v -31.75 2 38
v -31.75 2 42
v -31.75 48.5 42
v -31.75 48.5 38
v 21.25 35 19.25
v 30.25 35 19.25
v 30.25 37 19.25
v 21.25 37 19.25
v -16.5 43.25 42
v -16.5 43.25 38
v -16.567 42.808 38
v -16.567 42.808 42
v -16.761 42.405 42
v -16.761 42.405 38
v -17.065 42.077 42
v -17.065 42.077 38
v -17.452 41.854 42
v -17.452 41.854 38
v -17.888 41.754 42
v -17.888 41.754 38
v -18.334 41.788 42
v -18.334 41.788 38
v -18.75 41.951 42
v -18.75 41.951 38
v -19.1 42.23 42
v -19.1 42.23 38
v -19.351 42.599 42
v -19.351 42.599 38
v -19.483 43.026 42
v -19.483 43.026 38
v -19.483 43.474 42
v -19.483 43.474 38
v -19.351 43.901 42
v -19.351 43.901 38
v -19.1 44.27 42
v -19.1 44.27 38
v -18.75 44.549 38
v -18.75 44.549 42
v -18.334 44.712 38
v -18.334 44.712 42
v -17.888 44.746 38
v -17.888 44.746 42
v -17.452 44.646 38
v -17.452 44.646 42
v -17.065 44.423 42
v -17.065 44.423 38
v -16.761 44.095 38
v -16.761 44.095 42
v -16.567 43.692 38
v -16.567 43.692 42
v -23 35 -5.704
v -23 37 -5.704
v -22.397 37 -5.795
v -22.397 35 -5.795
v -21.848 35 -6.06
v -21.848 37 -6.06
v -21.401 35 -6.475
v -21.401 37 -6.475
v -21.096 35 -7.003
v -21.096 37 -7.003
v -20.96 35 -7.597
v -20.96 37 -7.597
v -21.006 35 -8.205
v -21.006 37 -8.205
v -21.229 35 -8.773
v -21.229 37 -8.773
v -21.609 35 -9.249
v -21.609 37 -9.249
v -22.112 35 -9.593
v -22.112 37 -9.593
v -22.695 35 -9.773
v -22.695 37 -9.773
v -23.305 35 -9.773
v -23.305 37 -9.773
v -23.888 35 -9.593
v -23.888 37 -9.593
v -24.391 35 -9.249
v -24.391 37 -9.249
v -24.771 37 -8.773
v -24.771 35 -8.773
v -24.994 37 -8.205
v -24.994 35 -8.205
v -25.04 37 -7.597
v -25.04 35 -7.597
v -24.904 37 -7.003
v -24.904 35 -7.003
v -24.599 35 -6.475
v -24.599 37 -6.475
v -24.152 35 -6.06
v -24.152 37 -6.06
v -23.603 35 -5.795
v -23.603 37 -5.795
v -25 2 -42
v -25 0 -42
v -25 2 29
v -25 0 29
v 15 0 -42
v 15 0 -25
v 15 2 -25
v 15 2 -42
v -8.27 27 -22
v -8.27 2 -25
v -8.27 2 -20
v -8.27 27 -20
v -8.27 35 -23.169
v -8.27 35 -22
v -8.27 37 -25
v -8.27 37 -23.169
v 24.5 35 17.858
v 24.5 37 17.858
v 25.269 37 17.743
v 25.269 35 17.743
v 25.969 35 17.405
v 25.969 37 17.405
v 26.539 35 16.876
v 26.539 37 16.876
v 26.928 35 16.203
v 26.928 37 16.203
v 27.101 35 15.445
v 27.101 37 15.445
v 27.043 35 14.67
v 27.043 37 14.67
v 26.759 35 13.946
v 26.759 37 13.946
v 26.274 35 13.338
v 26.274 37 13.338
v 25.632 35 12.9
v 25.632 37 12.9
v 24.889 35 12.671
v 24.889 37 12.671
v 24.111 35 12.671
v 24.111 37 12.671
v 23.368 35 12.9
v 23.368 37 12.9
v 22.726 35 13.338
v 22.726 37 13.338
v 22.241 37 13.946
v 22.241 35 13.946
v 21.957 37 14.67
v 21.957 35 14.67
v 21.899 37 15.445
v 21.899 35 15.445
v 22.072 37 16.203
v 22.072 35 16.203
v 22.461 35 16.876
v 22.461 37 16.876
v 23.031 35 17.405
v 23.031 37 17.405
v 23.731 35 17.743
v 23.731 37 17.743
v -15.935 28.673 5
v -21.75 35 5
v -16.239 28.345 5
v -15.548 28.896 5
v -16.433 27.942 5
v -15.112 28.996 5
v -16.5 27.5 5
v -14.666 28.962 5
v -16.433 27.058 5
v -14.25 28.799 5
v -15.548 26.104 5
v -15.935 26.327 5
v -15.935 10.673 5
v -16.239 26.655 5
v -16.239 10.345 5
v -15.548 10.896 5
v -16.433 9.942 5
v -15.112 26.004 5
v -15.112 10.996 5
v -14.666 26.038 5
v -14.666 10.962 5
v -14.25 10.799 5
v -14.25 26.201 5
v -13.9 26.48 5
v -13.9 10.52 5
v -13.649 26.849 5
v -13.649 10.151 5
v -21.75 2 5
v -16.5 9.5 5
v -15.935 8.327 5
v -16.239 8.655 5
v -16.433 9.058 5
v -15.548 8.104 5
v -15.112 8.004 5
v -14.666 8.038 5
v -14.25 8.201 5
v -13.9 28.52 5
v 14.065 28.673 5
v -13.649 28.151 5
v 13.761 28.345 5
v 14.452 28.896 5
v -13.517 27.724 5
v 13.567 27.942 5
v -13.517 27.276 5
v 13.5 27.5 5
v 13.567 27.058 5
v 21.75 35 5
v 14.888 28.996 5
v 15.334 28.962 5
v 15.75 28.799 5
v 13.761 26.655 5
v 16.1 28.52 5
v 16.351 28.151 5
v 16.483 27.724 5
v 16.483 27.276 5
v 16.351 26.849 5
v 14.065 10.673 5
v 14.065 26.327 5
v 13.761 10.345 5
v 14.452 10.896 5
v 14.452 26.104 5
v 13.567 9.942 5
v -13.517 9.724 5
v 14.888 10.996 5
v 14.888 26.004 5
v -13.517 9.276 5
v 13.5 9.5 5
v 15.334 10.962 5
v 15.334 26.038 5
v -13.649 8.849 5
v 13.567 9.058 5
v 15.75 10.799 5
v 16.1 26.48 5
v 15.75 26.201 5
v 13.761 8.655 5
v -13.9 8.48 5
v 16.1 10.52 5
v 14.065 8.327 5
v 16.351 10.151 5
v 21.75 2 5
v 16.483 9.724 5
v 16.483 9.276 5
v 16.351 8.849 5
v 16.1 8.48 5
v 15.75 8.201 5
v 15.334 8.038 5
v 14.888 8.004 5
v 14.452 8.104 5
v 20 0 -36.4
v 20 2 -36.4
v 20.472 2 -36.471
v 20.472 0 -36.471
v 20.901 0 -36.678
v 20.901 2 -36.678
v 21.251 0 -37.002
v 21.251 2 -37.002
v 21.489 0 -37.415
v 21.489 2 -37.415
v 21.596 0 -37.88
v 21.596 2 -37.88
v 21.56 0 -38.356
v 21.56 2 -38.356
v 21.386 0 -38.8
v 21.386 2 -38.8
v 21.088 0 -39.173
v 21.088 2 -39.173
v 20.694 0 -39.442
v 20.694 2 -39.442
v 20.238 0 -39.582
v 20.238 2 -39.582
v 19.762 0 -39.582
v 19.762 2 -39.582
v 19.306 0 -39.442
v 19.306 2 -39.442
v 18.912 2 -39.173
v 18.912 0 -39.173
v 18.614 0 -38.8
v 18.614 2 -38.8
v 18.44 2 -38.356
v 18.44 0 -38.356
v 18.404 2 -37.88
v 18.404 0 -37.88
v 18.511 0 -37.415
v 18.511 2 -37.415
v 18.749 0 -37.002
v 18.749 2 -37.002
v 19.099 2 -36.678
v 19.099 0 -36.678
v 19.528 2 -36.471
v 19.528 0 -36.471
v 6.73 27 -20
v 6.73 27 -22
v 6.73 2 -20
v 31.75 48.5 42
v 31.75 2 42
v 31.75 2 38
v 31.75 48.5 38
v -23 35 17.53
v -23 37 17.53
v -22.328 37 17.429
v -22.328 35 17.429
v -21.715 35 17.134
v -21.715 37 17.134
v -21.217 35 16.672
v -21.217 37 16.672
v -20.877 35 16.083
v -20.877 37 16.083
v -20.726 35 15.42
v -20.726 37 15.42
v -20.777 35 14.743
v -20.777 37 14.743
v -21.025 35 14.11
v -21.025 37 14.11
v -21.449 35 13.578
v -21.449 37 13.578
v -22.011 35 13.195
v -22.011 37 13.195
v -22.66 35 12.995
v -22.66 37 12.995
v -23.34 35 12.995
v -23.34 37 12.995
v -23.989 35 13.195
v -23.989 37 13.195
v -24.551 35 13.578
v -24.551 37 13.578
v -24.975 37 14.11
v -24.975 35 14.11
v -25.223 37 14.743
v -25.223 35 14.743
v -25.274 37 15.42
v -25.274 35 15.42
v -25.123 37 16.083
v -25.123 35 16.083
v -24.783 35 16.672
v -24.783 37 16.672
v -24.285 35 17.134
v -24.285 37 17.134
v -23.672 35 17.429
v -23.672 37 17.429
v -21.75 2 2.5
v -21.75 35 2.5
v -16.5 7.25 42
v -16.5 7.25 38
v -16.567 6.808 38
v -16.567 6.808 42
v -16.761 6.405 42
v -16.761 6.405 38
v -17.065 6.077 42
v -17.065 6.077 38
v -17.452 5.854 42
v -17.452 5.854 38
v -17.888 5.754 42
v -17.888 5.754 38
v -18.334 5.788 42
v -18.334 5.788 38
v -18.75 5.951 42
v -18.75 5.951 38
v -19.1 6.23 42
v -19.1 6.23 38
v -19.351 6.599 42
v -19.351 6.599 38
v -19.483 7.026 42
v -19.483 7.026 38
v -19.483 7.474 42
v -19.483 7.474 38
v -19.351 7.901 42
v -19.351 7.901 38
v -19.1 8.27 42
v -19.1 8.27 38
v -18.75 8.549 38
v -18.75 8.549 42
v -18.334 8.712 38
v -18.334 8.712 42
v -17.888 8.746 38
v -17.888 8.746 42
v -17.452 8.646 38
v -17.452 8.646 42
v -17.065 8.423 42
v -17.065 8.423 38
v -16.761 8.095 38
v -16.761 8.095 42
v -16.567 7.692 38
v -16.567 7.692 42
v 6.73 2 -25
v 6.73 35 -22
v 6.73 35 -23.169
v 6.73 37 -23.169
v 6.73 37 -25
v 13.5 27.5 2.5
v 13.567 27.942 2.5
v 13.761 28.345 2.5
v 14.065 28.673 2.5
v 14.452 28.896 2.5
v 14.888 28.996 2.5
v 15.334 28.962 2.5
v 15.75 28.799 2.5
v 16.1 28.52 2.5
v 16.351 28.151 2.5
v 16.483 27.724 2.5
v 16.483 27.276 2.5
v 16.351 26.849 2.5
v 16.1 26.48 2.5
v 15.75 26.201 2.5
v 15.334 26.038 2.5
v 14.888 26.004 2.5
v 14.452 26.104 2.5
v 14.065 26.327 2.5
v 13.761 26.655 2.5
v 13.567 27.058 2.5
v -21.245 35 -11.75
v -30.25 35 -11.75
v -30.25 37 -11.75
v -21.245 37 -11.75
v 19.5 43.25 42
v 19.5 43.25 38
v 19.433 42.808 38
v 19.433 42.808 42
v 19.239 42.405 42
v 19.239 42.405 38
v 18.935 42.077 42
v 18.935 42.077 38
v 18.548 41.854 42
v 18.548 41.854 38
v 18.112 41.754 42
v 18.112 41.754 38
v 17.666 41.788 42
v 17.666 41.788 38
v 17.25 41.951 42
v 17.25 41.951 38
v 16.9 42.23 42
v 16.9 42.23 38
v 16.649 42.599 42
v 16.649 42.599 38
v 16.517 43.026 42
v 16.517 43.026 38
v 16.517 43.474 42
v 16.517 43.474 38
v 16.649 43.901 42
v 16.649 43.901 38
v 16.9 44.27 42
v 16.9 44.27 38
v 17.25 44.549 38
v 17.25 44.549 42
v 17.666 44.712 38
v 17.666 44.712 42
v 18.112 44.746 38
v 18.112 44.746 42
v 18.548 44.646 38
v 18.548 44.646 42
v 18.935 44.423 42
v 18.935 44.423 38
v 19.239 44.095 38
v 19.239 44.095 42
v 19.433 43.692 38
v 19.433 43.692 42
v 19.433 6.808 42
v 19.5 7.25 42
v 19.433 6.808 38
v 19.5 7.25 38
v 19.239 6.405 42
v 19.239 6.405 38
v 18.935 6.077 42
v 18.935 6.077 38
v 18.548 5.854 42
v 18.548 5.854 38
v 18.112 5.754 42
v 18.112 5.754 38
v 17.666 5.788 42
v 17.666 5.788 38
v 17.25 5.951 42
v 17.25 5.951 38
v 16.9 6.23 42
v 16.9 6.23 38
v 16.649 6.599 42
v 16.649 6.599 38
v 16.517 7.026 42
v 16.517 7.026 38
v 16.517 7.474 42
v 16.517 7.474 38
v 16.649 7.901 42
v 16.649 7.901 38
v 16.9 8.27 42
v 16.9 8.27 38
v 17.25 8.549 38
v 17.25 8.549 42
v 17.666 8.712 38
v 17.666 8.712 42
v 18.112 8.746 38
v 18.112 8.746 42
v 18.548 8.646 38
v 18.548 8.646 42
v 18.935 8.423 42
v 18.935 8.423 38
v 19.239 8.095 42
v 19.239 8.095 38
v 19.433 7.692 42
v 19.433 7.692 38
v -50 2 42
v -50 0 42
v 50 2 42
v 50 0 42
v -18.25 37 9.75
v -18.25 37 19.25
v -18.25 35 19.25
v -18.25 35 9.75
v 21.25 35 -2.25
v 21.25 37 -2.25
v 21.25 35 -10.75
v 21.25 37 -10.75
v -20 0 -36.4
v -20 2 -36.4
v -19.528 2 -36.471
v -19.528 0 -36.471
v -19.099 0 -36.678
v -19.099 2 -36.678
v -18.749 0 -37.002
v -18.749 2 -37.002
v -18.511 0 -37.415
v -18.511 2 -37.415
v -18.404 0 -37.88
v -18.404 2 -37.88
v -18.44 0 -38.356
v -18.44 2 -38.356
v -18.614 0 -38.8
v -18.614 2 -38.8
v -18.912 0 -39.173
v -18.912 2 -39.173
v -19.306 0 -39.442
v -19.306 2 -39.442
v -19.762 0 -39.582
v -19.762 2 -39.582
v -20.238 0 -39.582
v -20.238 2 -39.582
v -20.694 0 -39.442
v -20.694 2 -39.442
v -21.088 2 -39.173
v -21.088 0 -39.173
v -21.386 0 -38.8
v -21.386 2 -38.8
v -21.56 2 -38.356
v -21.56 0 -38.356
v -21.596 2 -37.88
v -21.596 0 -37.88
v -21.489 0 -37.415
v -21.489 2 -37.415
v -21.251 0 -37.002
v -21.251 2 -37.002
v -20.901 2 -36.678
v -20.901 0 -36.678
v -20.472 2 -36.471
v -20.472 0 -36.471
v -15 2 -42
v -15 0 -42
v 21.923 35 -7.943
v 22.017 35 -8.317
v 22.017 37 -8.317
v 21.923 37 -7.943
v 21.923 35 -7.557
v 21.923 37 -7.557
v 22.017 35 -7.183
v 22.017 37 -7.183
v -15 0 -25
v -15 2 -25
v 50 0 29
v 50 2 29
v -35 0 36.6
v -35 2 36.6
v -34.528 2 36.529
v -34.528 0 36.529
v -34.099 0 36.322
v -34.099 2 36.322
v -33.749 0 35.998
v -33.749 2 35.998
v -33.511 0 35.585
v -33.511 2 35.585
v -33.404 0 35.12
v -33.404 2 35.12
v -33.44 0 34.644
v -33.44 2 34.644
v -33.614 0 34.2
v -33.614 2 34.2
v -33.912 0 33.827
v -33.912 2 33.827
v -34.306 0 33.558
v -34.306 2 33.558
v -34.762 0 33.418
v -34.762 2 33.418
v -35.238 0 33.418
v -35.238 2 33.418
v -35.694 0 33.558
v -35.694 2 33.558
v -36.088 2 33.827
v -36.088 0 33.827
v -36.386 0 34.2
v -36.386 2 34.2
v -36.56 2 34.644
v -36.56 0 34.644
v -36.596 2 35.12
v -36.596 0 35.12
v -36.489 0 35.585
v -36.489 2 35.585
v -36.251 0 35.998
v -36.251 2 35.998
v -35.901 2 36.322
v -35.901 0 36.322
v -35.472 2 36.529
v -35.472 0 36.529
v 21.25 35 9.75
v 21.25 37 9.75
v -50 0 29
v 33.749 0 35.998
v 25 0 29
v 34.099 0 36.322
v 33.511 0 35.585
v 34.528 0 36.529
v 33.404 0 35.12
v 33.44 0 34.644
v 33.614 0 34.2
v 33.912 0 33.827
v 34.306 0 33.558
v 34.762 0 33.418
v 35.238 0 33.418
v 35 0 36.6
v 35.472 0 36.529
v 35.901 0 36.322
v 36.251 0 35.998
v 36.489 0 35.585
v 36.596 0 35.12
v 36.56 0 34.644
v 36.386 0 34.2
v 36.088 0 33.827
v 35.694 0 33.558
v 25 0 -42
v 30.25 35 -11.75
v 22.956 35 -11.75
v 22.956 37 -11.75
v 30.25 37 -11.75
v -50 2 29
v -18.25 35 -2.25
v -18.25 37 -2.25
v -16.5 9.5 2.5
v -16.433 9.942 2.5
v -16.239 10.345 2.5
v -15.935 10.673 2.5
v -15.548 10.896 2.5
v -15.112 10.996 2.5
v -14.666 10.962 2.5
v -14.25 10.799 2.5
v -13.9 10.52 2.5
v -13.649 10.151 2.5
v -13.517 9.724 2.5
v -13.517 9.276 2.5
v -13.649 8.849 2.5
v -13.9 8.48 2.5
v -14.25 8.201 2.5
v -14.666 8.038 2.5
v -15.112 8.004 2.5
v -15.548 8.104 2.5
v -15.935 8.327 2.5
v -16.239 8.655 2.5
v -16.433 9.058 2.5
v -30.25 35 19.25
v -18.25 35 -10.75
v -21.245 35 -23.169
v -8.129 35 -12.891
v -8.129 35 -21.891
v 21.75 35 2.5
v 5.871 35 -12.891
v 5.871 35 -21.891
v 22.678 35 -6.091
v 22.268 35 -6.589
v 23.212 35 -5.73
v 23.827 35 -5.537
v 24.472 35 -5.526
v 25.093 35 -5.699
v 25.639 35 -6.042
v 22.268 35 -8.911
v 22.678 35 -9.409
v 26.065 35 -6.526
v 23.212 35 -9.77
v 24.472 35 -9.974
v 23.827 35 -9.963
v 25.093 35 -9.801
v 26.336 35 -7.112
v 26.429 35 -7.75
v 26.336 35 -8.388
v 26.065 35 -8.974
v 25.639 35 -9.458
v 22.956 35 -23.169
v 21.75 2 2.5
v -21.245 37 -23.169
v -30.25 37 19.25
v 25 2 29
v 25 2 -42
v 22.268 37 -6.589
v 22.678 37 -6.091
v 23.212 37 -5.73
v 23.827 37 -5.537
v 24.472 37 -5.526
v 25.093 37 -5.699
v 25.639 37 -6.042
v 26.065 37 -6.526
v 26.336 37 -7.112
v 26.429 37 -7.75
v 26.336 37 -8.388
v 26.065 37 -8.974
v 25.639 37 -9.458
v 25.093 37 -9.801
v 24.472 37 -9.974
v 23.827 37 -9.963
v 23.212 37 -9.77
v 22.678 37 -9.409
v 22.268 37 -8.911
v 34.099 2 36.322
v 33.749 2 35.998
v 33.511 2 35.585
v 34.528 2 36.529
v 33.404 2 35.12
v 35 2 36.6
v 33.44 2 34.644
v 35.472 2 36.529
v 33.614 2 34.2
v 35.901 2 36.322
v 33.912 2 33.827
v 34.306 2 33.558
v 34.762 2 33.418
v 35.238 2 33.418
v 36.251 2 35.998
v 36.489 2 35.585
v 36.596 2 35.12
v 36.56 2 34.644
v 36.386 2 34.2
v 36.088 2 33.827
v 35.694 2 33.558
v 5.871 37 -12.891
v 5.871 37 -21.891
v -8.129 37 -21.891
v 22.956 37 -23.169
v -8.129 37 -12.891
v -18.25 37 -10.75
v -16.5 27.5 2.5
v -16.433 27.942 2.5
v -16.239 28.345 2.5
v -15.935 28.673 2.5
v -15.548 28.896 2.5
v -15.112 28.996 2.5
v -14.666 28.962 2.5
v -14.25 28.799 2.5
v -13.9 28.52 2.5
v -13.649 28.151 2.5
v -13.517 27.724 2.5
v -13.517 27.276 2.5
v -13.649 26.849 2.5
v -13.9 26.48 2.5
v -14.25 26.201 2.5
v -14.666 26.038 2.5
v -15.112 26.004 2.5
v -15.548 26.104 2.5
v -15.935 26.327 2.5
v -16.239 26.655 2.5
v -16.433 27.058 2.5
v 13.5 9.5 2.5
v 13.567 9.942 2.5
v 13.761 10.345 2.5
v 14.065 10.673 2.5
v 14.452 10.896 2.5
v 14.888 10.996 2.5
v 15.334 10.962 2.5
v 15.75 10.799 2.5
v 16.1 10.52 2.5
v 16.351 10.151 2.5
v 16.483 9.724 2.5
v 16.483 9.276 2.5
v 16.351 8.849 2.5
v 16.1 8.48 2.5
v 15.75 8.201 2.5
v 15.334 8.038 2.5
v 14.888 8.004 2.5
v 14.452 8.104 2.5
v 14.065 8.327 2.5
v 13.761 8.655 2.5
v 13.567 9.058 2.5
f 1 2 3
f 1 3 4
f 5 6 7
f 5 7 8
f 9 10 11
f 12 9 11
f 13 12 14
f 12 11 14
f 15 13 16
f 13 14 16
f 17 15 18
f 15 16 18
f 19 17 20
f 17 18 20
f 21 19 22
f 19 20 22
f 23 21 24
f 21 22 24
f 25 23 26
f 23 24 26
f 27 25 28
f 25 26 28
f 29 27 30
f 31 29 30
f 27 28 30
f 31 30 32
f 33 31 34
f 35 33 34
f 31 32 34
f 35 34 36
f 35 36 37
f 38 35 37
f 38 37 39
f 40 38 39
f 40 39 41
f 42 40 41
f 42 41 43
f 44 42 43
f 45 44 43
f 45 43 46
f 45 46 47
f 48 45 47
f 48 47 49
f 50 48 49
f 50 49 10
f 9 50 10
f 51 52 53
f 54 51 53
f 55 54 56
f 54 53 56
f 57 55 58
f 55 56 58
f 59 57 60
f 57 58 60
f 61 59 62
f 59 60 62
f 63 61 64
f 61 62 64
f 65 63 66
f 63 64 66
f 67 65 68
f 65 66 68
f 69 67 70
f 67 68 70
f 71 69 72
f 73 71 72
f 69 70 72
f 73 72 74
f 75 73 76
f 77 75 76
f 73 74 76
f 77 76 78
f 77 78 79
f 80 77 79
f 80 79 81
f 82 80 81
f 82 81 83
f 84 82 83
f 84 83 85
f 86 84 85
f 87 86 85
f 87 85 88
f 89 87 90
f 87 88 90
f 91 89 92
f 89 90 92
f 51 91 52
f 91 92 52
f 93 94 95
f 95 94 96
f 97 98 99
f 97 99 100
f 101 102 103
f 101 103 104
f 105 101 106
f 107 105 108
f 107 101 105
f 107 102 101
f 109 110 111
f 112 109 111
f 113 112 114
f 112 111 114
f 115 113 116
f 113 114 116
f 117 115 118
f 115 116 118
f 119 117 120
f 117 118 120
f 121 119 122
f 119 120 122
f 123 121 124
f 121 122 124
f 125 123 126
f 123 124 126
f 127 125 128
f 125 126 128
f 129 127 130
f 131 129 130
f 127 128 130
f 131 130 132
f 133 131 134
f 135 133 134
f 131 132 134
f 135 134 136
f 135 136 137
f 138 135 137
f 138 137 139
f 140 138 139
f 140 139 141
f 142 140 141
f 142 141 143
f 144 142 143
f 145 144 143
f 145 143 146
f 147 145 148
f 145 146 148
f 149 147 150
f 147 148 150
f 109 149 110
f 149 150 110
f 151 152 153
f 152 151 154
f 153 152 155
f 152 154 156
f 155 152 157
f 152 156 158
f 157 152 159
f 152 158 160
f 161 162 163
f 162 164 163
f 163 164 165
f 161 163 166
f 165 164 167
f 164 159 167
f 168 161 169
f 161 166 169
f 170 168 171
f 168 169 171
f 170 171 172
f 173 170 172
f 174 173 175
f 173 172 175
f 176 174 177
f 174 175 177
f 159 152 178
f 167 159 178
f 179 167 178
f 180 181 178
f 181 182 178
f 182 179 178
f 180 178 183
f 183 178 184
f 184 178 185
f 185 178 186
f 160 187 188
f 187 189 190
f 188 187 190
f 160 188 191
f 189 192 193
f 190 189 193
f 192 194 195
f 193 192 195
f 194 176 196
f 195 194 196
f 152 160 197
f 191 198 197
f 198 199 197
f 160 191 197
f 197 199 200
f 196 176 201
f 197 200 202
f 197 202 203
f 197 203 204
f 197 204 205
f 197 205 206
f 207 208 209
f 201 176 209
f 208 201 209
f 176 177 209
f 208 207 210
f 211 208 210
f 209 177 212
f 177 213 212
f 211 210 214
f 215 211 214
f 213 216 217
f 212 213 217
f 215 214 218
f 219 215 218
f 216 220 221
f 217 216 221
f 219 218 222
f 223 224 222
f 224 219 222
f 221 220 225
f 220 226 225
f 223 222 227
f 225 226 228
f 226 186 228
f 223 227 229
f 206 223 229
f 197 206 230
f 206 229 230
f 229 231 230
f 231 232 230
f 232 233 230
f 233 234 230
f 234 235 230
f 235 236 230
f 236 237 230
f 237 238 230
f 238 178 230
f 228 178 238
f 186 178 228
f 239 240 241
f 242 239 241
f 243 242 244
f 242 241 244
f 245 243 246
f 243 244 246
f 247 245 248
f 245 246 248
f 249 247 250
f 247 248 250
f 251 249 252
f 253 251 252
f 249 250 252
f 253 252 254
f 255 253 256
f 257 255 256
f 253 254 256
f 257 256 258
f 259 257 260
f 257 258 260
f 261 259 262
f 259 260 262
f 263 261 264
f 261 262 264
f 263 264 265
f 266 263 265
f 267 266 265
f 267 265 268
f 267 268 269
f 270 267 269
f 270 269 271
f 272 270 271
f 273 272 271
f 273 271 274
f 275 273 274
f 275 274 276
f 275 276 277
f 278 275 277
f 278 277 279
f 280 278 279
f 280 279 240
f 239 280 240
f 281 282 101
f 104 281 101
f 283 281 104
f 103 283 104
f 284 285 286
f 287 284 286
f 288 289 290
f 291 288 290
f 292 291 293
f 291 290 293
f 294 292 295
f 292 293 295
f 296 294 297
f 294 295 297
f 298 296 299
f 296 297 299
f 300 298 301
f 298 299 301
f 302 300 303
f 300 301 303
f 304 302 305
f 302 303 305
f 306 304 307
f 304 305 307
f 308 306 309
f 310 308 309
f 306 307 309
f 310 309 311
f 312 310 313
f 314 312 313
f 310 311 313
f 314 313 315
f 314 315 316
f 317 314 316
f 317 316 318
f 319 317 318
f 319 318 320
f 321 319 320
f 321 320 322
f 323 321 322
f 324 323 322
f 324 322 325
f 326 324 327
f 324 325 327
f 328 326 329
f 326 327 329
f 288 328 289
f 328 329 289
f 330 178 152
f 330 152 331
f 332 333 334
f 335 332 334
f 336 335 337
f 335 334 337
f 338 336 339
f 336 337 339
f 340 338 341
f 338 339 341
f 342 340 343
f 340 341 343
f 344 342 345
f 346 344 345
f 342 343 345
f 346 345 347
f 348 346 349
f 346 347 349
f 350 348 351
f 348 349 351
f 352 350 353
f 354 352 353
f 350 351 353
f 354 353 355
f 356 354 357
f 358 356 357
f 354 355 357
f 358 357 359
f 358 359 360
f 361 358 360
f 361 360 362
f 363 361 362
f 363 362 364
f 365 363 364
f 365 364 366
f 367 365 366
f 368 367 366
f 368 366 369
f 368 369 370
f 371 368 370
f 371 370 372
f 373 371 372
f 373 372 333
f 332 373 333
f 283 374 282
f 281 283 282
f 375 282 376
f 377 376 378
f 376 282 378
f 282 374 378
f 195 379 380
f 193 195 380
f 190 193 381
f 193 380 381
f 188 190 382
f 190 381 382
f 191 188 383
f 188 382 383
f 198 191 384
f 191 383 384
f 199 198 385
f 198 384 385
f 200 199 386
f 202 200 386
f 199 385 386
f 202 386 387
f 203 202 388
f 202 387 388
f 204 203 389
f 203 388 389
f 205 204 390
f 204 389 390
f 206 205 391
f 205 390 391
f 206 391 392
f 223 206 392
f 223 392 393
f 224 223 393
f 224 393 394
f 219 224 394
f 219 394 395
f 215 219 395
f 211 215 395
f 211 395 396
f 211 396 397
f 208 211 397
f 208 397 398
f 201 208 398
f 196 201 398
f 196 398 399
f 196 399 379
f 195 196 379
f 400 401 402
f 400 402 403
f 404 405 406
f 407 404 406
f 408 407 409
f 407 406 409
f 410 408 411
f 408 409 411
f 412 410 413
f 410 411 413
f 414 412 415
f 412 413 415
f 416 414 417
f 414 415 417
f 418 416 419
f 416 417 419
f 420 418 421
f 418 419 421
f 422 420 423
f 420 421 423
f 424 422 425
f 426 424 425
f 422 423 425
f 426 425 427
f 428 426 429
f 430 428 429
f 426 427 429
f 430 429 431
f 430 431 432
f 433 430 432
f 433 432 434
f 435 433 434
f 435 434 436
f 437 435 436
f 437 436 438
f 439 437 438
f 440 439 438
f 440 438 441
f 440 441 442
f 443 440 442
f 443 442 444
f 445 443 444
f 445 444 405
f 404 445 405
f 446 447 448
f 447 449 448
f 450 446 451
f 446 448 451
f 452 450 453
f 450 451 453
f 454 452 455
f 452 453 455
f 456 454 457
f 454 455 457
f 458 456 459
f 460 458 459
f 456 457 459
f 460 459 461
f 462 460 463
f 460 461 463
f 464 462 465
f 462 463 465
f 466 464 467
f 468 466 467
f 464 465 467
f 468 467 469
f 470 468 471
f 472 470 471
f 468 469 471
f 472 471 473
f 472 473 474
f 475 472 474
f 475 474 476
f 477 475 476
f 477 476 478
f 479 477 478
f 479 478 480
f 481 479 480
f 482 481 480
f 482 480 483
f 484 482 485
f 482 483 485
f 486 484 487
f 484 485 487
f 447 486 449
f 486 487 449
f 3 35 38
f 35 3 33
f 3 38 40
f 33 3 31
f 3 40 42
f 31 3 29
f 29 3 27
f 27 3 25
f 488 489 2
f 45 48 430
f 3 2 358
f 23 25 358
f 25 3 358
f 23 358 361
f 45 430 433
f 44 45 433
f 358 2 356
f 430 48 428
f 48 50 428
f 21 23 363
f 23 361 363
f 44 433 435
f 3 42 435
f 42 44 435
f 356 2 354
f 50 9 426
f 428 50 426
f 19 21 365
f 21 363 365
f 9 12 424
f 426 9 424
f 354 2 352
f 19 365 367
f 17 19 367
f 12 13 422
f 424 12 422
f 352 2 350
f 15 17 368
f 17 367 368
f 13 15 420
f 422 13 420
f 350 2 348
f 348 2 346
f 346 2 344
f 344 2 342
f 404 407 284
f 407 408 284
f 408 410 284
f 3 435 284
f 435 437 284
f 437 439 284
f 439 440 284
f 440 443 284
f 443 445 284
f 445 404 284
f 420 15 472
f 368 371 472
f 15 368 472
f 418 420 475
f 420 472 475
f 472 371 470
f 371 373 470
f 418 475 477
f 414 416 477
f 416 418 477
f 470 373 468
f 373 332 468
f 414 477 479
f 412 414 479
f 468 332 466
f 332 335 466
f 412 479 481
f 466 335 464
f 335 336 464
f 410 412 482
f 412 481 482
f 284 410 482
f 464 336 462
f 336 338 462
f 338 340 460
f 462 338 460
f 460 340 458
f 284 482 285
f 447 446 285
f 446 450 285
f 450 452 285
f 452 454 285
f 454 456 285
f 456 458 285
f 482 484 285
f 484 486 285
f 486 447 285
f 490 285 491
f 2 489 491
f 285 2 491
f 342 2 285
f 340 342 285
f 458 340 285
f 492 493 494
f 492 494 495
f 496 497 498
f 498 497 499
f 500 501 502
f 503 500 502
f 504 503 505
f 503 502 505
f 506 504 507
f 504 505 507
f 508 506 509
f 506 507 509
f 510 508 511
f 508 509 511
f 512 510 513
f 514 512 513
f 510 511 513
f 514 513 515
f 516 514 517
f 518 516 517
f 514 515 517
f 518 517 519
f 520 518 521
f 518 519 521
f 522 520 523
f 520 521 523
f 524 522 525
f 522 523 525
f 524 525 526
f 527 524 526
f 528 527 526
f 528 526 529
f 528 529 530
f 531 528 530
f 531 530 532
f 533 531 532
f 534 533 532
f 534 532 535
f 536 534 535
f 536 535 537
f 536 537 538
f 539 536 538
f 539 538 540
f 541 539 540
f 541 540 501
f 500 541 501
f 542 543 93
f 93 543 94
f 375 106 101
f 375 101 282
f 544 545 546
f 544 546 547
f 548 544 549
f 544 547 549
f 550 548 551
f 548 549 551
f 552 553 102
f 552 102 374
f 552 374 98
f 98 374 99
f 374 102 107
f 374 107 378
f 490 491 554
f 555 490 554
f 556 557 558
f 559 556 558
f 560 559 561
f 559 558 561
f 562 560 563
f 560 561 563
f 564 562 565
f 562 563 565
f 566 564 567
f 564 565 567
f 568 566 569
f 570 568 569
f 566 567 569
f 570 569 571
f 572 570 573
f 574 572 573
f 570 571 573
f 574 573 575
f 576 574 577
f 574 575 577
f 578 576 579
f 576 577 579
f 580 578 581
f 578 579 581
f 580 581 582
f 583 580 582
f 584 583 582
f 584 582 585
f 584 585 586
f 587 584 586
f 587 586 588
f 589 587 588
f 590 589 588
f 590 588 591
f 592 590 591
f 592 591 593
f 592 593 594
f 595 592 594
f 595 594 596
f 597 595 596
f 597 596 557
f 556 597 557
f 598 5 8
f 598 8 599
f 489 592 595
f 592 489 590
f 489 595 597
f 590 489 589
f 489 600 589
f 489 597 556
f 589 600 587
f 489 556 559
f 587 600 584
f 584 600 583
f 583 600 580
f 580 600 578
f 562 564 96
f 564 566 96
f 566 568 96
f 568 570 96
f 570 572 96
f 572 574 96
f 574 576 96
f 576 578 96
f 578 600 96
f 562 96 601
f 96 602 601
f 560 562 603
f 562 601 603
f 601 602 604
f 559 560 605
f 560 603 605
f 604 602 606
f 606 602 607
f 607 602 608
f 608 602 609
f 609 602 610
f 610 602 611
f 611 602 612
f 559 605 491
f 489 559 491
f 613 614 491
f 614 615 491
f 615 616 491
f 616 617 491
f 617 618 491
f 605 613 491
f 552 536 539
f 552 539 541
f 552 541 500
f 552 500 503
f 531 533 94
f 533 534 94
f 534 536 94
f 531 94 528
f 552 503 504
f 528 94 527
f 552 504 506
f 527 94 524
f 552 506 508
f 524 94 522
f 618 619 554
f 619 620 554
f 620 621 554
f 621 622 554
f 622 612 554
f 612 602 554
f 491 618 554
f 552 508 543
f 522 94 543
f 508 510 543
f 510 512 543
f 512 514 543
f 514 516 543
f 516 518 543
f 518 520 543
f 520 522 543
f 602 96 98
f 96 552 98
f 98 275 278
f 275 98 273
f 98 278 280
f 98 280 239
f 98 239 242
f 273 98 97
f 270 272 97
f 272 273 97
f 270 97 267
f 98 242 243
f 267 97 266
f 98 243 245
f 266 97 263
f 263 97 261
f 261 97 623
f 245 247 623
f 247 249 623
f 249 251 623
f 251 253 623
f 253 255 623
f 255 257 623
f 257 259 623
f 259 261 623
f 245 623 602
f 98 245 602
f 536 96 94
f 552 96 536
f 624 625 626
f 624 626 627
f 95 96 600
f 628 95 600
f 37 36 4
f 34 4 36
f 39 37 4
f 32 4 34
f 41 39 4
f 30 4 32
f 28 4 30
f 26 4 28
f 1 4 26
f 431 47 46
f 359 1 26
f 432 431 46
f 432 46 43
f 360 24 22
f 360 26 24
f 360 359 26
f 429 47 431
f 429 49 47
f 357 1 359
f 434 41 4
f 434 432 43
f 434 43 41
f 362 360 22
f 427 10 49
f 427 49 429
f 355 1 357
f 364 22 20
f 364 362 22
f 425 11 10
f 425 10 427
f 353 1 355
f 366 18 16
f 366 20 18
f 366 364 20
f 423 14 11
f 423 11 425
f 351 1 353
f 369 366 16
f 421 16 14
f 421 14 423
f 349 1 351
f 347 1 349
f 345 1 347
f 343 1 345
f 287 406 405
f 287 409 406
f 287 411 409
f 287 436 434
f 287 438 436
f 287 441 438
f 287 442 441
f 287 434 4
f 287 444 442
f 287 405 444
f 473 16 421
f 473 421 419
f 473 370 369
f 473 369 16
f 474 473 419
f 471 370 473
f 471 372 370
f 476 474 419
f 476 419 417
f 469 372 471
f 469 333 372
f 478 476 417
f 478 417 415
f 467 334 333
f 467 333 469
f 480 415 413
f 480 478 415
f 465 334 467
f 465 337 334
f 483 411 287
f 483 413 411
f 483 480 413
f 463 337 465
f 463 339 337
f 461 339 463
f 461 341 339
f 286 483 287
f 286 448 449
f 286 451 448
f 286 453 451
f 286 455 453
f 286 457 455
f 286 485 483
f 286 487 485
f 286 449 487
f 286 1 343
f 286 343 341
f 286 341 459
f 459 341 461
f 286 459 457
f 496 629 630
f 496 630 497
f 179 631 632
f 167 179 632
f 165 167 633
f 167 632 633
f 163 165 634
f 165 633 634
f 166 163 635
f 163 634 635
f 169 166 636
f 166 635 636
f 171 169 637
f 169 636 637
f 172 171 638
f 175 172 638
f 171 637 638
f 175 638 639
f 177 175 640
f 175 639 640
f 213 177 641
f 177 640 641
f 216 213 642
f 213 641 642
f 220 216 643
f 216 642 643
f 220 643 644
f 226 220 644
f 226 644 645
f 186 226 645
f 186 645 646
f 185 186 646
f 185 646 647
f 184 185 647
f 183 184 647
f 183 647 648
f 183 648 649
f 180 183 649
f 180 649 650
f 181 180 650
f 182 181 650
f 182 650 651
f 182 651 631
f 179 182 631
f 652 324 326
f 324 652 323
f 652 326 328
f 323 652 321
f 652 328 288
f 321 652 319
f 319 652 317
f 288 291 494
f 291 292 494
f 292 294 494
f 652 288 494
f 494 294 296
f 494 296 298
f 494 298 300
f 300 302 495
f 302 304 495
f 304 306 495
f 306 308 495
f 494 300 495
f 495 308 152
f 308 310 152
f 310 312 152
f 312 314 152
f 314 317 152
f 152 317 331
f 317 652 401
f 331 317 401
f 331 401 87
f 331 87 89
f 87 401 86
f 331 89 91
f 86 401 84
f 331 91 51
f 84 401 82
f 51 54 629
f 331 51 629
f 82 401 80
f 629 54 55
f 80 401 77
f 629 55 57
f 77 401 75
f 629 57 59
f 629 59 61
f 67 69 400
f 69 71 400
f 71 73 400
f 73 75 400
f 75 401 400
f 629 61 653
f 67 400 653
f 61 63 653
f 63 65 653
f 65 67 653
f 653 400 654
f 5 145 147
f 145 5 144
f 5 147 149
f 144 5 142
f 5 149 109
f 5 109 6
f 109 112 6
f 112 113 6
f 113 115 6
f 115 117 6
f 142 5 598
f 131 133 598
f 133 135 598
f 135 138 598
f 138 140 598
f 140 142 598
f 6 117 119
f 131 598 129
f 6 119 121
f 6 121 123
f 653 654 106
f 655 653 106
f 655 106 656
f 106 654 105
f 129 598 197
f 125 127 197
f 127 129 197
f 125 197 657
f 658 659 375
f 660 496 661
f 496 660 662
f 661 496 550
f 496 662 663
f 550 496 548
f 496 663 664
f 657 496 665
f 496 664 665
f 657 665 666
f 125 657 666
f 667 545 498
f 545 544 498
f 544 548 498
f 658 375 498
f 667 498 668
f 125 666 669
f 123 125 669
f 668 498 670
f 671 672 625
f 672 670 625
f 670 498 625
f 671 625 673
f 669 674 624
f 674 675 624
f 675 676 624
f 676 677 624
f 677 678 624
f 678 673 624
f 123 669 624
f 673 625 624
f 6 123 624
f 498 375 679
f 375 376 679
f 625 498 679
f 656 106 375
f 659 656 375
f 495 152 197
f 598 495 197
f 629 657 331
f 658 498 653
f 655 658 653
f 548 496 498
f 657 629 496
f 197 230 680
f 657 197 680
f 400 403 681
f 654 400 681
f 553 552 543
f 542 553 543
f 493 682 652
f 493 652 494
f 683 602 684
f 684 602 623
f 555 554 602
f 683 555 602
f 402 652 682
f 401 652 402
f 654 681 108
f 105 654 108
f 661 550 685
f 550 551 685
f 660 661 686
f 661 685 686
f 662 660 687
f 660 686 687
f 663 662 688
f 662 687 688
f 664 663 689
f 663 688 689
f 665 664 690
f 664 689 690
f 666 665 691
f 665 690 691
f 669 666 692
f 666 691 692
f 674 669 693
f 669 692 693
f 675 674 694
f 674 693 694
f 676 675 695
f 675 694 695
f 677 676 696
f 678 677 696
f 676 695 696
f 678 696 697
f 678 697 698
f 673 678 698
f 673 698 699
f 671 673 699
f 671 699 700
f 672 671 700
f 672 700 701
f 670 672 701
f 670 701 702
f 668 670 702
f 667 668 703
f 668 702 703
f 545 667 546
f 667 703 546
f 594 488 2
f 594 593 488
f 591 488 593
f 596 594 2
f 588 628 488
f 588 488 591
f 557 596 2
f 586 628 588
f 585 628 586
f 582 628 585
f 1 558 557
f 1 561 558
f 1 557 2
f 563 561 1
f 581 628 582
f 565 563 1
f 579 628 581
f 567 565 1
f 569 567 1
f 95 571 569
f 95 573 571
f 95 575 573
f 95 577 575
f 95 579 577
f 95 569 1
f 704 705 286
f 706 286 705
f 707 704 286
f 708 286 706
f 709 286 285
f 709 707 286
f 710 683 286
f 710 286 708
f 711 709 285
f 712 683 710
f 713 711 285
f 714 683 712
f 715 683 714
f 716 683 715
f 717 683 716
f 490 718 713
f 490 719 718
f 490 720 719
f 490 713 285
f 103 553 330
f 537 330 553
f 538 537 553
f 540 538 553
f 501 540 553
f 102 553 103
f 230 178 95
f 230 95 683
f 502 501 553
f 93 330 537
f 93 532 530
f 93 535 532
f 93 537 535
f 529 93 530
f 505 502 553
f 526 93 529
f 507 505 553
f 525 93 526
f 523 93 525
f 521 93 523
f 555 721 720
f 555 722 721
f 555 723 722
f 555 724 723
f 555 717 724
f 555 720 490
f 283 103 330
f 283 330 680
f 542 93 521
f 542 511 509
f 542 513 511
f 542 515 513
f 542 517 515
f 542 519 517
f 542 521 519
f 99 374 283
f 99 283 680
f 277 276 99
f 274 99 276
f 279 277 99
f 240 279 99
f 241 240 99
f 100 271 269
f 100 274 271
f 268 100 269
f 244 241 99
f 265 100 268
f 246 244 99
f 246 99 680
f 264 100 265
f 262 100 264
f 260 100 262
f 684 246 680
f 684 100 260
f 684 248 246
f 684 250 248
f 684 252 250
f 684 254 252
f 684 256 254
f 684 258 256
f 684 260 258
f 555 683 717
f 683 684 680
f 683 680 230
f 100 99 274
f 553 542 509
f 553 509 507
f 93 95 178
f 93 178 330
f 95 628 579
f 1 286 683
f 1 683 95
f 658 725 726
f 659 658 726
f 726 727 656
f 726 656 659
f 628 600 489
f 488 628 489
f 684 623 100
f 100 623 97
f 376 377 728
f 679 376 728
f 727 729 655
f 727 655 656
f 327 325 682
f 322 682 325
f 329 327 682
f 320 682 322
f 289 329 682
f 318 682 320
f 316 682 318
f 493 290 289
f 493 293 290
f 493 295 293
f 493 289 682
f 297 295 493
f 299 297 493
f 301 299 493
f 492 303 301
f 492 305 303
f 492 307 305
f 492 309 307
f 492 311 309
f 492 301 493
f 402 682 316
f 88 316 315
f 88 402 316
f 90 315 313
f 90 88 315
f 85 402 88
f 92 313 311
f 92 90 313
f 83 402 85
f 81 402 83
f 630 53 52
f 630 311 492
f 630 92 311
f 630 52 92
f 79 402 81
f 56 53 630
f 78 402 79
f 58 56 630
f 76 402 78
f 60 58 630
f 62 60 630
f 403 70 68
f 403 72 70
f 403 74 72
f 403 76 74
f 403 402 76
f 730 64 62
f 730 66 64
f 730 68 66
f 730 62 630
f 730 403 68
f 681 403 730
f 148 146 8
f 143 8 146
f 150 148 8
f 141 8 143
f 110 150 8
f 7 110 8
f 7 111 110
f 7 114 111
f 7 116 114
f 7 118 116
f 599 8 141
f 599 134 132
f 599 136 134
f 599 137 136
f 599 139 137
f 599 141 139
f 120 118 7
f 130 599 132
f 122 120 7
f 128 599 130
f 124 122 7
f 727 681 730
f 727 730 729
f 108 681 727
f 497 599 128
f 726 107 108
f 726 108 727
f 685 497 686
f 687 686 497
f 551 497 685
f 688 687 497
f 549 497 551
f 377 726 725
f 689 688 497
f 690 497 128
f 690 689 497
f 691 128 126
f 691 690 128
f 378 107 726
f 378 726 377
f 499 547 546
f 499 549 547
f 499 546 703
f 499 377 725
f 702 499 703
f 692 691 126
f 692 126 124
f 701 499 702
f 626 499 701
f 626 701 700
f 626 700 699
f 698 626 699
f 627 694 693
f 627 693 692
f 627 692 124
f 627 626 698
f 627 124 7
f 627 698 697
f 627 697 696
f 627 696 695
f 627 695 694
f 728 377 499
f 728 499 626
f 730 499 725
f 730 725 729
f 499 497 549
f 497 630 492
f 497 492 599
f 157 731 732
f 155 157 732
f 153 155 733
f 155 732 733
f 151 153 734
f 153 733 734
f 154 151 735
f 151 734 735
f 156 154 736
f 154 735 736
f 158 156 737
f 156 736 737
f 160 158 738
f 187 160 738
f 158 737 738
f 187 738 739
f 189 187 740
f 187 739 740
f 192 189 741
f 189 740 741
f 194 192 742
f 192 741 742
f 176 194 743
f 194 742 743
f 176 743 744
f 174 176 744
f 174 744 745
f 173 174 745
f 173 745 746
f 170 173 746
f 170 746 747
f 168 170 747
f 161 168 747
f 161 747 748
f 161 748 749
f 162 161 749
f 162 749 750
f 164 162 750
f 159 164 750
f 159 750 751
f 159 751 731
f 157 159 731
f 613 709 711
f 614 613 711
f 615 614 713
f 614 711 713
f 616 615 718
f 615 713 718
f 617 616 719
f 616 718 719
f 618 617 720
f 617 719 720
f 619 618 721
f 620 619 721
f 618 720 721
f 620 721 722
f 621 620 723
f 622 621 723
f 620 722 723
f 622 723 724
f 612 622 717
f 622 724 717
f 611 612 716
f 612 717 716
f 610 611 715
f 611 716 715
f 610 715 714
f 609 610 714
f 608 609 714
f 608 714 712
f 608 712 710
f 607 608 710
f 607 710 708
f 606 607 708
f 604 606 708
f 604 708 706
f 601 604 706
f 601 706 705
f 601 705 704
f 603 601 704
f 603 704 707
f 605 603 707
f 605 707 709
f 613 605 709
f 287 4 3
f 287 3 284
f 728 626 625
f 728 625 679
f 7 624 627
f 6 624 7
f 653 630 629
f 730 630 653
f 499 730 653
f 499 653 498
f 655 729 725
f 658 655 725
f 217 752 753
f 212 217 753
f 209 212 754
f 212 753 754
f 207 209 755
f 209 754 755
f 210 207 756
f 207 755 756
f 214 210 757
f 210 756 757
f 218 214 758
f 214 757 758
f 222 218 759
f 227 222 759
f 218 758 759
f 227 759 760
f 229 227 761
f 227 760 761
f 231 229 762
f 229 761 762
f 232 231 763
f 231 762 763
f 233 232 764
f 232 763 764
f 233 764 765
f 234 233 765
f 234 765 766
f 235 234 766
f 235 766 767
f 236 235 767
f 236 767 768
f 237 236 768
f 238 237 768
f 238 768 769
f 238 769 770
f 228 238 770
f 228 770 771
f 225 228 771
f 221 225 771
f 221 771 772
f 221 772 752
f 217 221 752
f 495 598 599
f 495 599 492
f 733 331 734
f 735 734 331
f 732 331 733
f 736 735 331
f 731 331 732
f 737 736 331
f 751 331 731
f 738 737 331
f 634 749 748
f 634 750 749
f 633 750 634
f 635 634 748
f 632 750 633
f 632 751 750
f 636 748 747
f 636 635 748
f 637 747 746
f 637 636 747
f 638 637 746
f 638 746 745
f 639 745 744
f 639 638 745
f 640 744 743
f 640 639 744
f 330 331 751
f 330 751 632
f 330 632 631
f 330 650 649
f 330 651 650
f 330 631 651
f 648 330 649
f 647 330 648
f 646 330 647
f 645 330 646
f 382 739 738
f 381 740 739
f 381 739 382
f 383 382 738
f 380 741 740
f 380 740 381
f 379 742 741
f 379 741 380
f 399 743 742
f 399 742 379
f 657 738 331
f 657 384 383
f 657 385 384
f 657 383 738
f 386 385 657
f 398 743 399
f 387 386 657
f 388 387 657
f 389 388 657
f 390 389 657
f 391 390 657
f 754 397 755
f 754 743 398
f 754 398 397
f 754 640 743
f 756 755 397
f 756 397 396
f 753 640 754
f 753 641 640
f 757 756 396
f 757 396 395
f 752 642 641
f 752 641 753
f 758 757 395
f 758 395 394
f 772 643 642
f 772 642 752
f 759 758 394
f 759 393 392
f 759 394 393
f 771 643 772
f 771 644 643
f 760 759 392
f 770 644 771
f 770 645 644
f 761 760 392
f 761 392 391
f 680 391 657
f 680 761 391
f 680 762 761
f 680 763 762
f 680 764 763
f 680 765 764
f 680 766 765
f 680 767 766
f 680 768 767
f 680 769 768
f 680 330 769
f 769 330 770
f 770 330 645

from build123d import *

# Parameters (mm, degrees)
SALIENTE_EXTRUIR1_DEPTH  = 2
CROQUIS2_W               = 30
CROQUIS2_H               = 17
CORTAR_EXTRUIR1_DEPTH    = 8
CROQUIS4_W               = 63.5
CROQUIS4_H               = 4
SALIENTE_EXTRUIR2_DEPTH  = 48.5
CROQUIS5_W               = 43.5
CROQUIS5_H               = 2.5
SALIENTE_EXTRUIR3_DEPTH  = 35
CROQUIS7_R               = 1.5
CORTAR_EXTRUIR2_DEPTH    = 9
CROQUIS8_R               = 1.5
CORTAR_EXTRUIR3_DEPTH    = 23
SALIENTE_EXTRUIR4_DEPTH  = 2
CROQUIS13_R              = 1.5
CORTAR_EXTRUIR4_DEPTH    = 2
CROQUIS16_W              = 3
CROQUIS16_H              = 31
SALIENTE_EXTRUIR7_DEPTH  = 2
CROQUIS17_W              = 15
CROQUIS17_H              = 3
SALIENTE_EXTRUIR8_DEPTH  = 25
CROQUIS21_W              = 15
CROQUIS21_H              = 3
SALIENTE_EXTRUIR9_DEPTH  = 2
CROQUIS25_R              = 3.826074219
CORTAR_EXTRUIR6_DEPTH    = 2
CROQUIS28_W              = 44.201296129
CROQUIS28_H              = 11.418561917
SALIENTE_EXTRUIR10_DEPTH = 2
CROQUIS30_W              = 15
CROQUIS30_H              = 3
SALIENTE_EXTRUIR11_DEPTH = 8
CROQUIS31_W              = 14
CROQUIS31_H              = 9
CORTAR_EXTRUIR7_DEPTH    = 2
CROQUIS33_W              = 39.5
CROQUIS33_H              = 1
SALIENTE_EXTRUIR13_DEPTH = 2
CROQUIS36_W              = 4.944902354
CROQUIS36_H              = 4.974433571
CROQUIS36_R              = 1.566702584
SALIENTE_EXTRUIR14_DEPTH = 2
CROQUIS37_R              = 2.242266835
CORTAR_EXTRUIR8_DEPTH    = 2
CROQUIS38_W              = 1.939564783
CROQUIS38_H              = 6.647351579
SALIENTE_EXTRUIR18_DEPTH = 2
CROQUIS39_R              = 2.608387943
CORTAR_EXTRUIR9_DEPTH    = 2
CROQUIS40_R              = 2.045540146
CORTAR_EXTRUIR10_DEPTH   = 2
CROQUIS41_R              = 2.280483158
CORTAR_EXTRUIR11_DEPTH   = 2
CROQUIS42_W              = 15
CROQUIS42_H              = 25
SALIENTE_EXTRUIR19_DEPTH = 5
CROQUIS43_R              = 1.6
CORTAR_EXTRUIR12_DEPTH   = 10


with BuildPart() as part:
    # Croquis1 → Saliente-Extruir1 (new body)
    with BuildSketch(Plane(origin=(0, 0, 0), x_dir=(1, 0, 0), z_dir=(0, 1, 0))):
        Polygon((25, 42), (-25, 42), (-25, -29), (-50, -29), (-50, -42), (50, -42), (50, -29), (25, -29), align=None)
    extrude(amount=SALIENTE_EXTRUIR1_DEPTH)

    # Croquis2 → Cortar-Extruir1 (cut)
    with BuildSketch(Plane(origin=(0, 0, 0), x_dir=(1, 0, 0), z_dir=(0, 1, 0))):
        with Locations((0, 33.5)):
            Rectangle(CROQUIS2_W, CROQUIS2_H)
    extrude(amount=CORTAR_EXTRUIR1_DEPTH, mode=Mode.SUBTRACT)

    # Croquis4 → Saliente-Extruir2 (add)
    with BuildSketch(Plane(origin=(0, 0, 0), x_dir=(1, 0, 0), z_dir=(0, 1, 0))):
        with Locations((0, -40)):
            Rectangle(CROQUIS4_W, CROQUIS4_H)
    extrude(amount=SALIENTE_EXTRUIR2_DEPTH)

    # Croquis5 → Saliente-Extruir3 (add)
    with BuildSketch(Plane(origin=(0, 0, 0), x_dir=(1, 0, 0), z_dir=(0, 1, 0))):
        with Locations((0, -3.75)):
            Rectangle(CROQUIS5_W, CROQUIS5_H)
    extrude(amount=SALIENTE_EXTRUIR3_DEPTH)

    # Croquis7 → Cortar-Extruir2 (cut, symmetric)
    with BuildSketch(Plane(origin=(0, 0, 38), x_dir=(-1, 0, 0), z_dir=(0, 0, -1))):
        with Locations(Location((-18, 43.25, 0), (0, 0, 180))):
            Circle(CROQUIS7_R)
        with Locations(Location((18, 43.25, 0), (0, 0, 180))):
            Circle(CROQUIS7_R)
        with Locations(Location((18, 7.25, 0), (0, 0, 180))):
            Circle(CROQUIS7_R)
        with Locations(Location((-18, 7.25, 0), (0, 0, 180))):
            Circle(CROQUIS7_R)
    extrude(amount=CORTAR_EXTRUIR2_DEPTH, both=True, mode=Mode.SUBTRACT)

    # Croquis8 → Cortar-Extruir3 (cut)
    with BuildSketch(Plane(origin=(0, 0, 2.5), x_dir=(-1, 0, 0), z_dir=(0, 0, -1))):
        with Locations((-15, 27.5)):
            Circle(CROQUIS8_R)
        with Locations((15, 9.5)):
            Circle(CROQUIS8_R)
        with Locations((15, 27.5)):
            Circle(CROQUIS8_R)
        with Locations((-15, 9.5)):
            Circle(CROQUIS8_R)
    extrude(amount=-CORTAR_EXTRUIR3_DEPTH, mode=Mode.SUBTRACT)



with BuildPart() as body_2:
    # Croquis12 → Saliente-Extruir4 (new body)
    with BuildSketch(Plane(origin=(0, 35, -35), x_dir=(1, 0, 0), z_dir=(0, -1, 0))):
        Polygon((21.25, 44.75), (-21.25, 44.75), (-21.25, 54.25), (-30.25, 54.25), (-30.25, 23.25), (-21.25, 23.25), (-21.25, 32.75), (21.25, 32.75), (21.25, 23.25), (30.25, 23.25), (30.25, 54.25), (21.25, 54.25), align=None)
    extrude(amount=-SALIENTE_EXTRUIR4_DEPTH)

    # Croquis13 → Cortar-Extruir4 (cut)
    with BuildSketch(Plane(origin=(0, 37, 0), x_dir=(1, 0, 0), z_dir=(0, 1, 0))):
        with Locations(Location((23, -15.25, 0), (0, 0, 270))):
            Circle(CROQUIS13_R)
        with Locations(Location((23, 7.75, 0), (0, 0, 90))):
            Circle(CROQUIS13_R)
        with Locations(Location((-23, 7.75, 0), (0, 0, 270))):
            Circle(CROQUIS13_R)
        with Locations(Location((-23, -15.25, 0), (0, 0, 90))):
            Circle(CROQUIS13_R)
    extrude(amount=-CORTAR_EXTRUIR4_DEPTH, mode=Mode.SUBTRACT)


with BuildPart() as part_1:
    add(part.part)

    add(body_2.part)  # Saliente-Extruir7 merges body 2
    # Croquis16 → Saliente-Extruir7 (add)
    with BuildSketch(Plane(origin=(0, 37, 0), x_dir=(1, 0, 0), z_dir=(0, 1, 0))):
        with Locations((-19.75, -3.75)):
            Rectangle(CROQUIS16_W, CROQUIS16_H)
    extrude(amount=-SALIENTE_EXTRUIR7_DEPTH)

    # Croquis17 → Saliente-Extruir8 (add)
    with BuildSketch(Plane(origin=(0, 2, 0), x_dir=(1, 0, 0), z_dir=(0, 1, 0))):
        with Locations((-0.769919921, 23.5)):
            Rectangle(CROQUIS17_W, CROQUIS17_H)
    extrude(amount=SALIENTE_EXTRUIR8_DEPTH)

    # Croquis21 → Saliente-Extruir9 (add)
    with BuildSketch(Plane(origin=(0, 27, 0), x_dir=(1, 0, 0), z_dir=(0, 1, 0))):
        with Locations((-0.769919921, 23.5)):
            Rectangle(CROQUIS21_W, CROQUIS21_H)
    extrude(amount=SALIENTE_EXTRUIR9_DEPTH)

    # Croquis25 → Cortar-Extruir6 (cut)
    with BuildSketch(Plane(origin=(0, 0, -25), x_dir=(-1, 0, 0), z_dir=(0, 0, -1))):
        with Locations((1.065680286, 20.360266958)):
            Circle(CROQUIS25_R)
    extrude(amount=-CORTAR_EXTRUIR6_DEPTH, mode=Mode.SUBTRACT)

    # Croquis28 → Saliente-Extruir10 (add)
    with BuildSketch(Plane(origin=(0, 37, 0), x_dir=(1, 0, 0), z_dir=(0, 1, 0))):
        with Locations((0.855508958, 17.459280959)):
            Rectangle(CROQUIS28_W, CROQUIS28_H)
    extrude(amount=-SALIENTE_EXTRUIR10_DEPTH)

    # Croquis30 → Saliente-Extruir11 (add)
    with BuildSketch(Plane(origin=(0, 37, 0), x_dir=(1, 0, 0), z_dir=(0, 1, 0))):
        with Locations((-0.769919921, 23.5)):
            Rectangle(CROQUIS30_W, CROQUIS30_H)
    extrude(amount=-SALIENTE_EXTRUIR11_DEPTH)

    # Croquis31 → Cortar-Extruir7 (cut)
    with BuildSketch(Plane(origin=(0, 37, 0), x_dir=(1, 0, 0), z_dir=(0, 1, 0))):
        with Locations((-1.129241311, 17.391372283)):
            Rectangle(CROQUIS31_W, CROQUIS31_H)
    extrude(amount=-CORTAR_EXTRUIR7_DEPTH, mode=Mode.SUBTRACT)

    # Croquis33 → Saliente-Extruir13 (add)
    with BuildSketch(Plane(origin=(0, 37, 0), x_dir=(1, 0, 0), z_dir=(0, 1, 0))):
        with Locations((1.5, 11.25)):
            Rectangle(CROQUIS33_W, CROQUIS33_H)
    extrude(amount=-SALIENTE_EXTRUIR13_DEPTH)

    # Croquis36 → Saliente-Extruir14 (add)
    with BuildSketch(Plane(origin=(0, 37, 0), x_dir=(1, 0, 0), z_dir=(0, 1, 0))):
        with Locations((23.722451177, 7.461073997)):
            Rectangle(CROQUIS36_W, CROQUIS36_H)
        with Locations((23.477387718, 7.75)):
            Circle(CROQUIS36_R, mode=Mode.SUBTRACT)
    extrude(amount=-SALIENTE_EXTRUIR14_DEPTH)

    # Croquis37 → Cortar-Extruir8 (cut)
    with BuildSketch(Plane(origin=(0, 37, 0), x_dir=(1, 0, 0), z_dir=(0, 1, 0))):
        with Locations((24.186288099, 7.75)):
            Circle(CROQUIS37_R)
    extrude(amount=-CORTAR_EXTRUIR8_DEPTH, mode=Mode.SUBTRACT)

    # Croquis38 → Saliente-Extruir18 (add)
    with BuildSketch(Plane(origin=(0, 37, 0), x_dir=(1, 0, 0), z_dir=(0, 1, 0))):
        with Locations((22.219782392, -15.926324211)):
            Rectangle(CROQUIS38_W, CROQUIS38_H)
    extrude(amount=-SALIENTE_EXTRUIR18_DEPTH)

    # Croquis39 → Cortar-Extruir9 (cut)
    with BuildSketch(Plane(origin=(0, 37, 0), x_dir=(1, 0, 0), z_dir=(0, 1, 0))):
        with Locations(Location((24.5, -15.25, 0), (0, 0, 270))):
            Circle(CROQUIS39_R)
    extrude(amount=-CORTAR_EXTRUIR9_DEPTH, mode=Mode.SUBTRACT)

    # Croquis40 → Cortar-Extruir10 (cut)
    with BuildSketch(Plane(origin=(0, 37, 0), x_dir=(1, 0, 0), z_dir=(0, 1, 0))):
        with Locations(Location((-23, 7.75, 0), (0, 0, 270))):
            Circle(CROQUIS40_R)
    extrude(amount=-CORTAR_EXTRUIR10_DEPTH, mode=Mode.SUBTRACT)

    # Croquis41 → Cortar-Extruir11 (cut)
    with BuildSketch(Plane(origin=(0, 37, 0), x_dir=(1, 0, 0), z_dir=(0, 1, 0))):
        with Locations(Location((-23, -15.25, 0), (0, 0, 270))):
            Circle(CROQUIS41_R)
    extrude(amount=-CORTAR_EXTRUIR11_DEPTH, mode=Mode.SUBTRACT)

    # Croquis42 → Saliente-Extruir19 (add)
    with BuildSketch(Plane(origin=(0, 0, -25), x_dir=(-1, 0, 0), z_dir=(0, 0, -1))):
        with Locations((0.769919921, 14.5)):
            Rectangle(CROQUIS42_W, CROQUIS42_H)
    extrude(amount=-SALIENTE_EXTRUIR19_DEPTH)

    # Croquis43 → Cortar-Extruir12 (cut)
    with BuildSketch(Plane(origin=(0, 2, 0), x_dir=(1, 0, 0), z_dir=(0, 1, 0))):
        with Locations(Location((-20, 38, 0), (0, 0, 270))):
            Circle(CROQUIS43_R)
        with Locations(Location((20, 38, 0), (0, 0, 270))):
            Circle(CROQUIS43_R)
        with Locations(Location((-35, -35, 0), (0, 0, 270))):
            Circle(CROQUIS43_R)
        with Locations(Location((35, -35, 0), (0, 0, 270))):
            Circle(CROQUIS43_R)
    extrude(amount=-CORTAR_EXTRUIR12_DEPTH, mode=Mode.SUBTRACT)


solid = part_1.part
